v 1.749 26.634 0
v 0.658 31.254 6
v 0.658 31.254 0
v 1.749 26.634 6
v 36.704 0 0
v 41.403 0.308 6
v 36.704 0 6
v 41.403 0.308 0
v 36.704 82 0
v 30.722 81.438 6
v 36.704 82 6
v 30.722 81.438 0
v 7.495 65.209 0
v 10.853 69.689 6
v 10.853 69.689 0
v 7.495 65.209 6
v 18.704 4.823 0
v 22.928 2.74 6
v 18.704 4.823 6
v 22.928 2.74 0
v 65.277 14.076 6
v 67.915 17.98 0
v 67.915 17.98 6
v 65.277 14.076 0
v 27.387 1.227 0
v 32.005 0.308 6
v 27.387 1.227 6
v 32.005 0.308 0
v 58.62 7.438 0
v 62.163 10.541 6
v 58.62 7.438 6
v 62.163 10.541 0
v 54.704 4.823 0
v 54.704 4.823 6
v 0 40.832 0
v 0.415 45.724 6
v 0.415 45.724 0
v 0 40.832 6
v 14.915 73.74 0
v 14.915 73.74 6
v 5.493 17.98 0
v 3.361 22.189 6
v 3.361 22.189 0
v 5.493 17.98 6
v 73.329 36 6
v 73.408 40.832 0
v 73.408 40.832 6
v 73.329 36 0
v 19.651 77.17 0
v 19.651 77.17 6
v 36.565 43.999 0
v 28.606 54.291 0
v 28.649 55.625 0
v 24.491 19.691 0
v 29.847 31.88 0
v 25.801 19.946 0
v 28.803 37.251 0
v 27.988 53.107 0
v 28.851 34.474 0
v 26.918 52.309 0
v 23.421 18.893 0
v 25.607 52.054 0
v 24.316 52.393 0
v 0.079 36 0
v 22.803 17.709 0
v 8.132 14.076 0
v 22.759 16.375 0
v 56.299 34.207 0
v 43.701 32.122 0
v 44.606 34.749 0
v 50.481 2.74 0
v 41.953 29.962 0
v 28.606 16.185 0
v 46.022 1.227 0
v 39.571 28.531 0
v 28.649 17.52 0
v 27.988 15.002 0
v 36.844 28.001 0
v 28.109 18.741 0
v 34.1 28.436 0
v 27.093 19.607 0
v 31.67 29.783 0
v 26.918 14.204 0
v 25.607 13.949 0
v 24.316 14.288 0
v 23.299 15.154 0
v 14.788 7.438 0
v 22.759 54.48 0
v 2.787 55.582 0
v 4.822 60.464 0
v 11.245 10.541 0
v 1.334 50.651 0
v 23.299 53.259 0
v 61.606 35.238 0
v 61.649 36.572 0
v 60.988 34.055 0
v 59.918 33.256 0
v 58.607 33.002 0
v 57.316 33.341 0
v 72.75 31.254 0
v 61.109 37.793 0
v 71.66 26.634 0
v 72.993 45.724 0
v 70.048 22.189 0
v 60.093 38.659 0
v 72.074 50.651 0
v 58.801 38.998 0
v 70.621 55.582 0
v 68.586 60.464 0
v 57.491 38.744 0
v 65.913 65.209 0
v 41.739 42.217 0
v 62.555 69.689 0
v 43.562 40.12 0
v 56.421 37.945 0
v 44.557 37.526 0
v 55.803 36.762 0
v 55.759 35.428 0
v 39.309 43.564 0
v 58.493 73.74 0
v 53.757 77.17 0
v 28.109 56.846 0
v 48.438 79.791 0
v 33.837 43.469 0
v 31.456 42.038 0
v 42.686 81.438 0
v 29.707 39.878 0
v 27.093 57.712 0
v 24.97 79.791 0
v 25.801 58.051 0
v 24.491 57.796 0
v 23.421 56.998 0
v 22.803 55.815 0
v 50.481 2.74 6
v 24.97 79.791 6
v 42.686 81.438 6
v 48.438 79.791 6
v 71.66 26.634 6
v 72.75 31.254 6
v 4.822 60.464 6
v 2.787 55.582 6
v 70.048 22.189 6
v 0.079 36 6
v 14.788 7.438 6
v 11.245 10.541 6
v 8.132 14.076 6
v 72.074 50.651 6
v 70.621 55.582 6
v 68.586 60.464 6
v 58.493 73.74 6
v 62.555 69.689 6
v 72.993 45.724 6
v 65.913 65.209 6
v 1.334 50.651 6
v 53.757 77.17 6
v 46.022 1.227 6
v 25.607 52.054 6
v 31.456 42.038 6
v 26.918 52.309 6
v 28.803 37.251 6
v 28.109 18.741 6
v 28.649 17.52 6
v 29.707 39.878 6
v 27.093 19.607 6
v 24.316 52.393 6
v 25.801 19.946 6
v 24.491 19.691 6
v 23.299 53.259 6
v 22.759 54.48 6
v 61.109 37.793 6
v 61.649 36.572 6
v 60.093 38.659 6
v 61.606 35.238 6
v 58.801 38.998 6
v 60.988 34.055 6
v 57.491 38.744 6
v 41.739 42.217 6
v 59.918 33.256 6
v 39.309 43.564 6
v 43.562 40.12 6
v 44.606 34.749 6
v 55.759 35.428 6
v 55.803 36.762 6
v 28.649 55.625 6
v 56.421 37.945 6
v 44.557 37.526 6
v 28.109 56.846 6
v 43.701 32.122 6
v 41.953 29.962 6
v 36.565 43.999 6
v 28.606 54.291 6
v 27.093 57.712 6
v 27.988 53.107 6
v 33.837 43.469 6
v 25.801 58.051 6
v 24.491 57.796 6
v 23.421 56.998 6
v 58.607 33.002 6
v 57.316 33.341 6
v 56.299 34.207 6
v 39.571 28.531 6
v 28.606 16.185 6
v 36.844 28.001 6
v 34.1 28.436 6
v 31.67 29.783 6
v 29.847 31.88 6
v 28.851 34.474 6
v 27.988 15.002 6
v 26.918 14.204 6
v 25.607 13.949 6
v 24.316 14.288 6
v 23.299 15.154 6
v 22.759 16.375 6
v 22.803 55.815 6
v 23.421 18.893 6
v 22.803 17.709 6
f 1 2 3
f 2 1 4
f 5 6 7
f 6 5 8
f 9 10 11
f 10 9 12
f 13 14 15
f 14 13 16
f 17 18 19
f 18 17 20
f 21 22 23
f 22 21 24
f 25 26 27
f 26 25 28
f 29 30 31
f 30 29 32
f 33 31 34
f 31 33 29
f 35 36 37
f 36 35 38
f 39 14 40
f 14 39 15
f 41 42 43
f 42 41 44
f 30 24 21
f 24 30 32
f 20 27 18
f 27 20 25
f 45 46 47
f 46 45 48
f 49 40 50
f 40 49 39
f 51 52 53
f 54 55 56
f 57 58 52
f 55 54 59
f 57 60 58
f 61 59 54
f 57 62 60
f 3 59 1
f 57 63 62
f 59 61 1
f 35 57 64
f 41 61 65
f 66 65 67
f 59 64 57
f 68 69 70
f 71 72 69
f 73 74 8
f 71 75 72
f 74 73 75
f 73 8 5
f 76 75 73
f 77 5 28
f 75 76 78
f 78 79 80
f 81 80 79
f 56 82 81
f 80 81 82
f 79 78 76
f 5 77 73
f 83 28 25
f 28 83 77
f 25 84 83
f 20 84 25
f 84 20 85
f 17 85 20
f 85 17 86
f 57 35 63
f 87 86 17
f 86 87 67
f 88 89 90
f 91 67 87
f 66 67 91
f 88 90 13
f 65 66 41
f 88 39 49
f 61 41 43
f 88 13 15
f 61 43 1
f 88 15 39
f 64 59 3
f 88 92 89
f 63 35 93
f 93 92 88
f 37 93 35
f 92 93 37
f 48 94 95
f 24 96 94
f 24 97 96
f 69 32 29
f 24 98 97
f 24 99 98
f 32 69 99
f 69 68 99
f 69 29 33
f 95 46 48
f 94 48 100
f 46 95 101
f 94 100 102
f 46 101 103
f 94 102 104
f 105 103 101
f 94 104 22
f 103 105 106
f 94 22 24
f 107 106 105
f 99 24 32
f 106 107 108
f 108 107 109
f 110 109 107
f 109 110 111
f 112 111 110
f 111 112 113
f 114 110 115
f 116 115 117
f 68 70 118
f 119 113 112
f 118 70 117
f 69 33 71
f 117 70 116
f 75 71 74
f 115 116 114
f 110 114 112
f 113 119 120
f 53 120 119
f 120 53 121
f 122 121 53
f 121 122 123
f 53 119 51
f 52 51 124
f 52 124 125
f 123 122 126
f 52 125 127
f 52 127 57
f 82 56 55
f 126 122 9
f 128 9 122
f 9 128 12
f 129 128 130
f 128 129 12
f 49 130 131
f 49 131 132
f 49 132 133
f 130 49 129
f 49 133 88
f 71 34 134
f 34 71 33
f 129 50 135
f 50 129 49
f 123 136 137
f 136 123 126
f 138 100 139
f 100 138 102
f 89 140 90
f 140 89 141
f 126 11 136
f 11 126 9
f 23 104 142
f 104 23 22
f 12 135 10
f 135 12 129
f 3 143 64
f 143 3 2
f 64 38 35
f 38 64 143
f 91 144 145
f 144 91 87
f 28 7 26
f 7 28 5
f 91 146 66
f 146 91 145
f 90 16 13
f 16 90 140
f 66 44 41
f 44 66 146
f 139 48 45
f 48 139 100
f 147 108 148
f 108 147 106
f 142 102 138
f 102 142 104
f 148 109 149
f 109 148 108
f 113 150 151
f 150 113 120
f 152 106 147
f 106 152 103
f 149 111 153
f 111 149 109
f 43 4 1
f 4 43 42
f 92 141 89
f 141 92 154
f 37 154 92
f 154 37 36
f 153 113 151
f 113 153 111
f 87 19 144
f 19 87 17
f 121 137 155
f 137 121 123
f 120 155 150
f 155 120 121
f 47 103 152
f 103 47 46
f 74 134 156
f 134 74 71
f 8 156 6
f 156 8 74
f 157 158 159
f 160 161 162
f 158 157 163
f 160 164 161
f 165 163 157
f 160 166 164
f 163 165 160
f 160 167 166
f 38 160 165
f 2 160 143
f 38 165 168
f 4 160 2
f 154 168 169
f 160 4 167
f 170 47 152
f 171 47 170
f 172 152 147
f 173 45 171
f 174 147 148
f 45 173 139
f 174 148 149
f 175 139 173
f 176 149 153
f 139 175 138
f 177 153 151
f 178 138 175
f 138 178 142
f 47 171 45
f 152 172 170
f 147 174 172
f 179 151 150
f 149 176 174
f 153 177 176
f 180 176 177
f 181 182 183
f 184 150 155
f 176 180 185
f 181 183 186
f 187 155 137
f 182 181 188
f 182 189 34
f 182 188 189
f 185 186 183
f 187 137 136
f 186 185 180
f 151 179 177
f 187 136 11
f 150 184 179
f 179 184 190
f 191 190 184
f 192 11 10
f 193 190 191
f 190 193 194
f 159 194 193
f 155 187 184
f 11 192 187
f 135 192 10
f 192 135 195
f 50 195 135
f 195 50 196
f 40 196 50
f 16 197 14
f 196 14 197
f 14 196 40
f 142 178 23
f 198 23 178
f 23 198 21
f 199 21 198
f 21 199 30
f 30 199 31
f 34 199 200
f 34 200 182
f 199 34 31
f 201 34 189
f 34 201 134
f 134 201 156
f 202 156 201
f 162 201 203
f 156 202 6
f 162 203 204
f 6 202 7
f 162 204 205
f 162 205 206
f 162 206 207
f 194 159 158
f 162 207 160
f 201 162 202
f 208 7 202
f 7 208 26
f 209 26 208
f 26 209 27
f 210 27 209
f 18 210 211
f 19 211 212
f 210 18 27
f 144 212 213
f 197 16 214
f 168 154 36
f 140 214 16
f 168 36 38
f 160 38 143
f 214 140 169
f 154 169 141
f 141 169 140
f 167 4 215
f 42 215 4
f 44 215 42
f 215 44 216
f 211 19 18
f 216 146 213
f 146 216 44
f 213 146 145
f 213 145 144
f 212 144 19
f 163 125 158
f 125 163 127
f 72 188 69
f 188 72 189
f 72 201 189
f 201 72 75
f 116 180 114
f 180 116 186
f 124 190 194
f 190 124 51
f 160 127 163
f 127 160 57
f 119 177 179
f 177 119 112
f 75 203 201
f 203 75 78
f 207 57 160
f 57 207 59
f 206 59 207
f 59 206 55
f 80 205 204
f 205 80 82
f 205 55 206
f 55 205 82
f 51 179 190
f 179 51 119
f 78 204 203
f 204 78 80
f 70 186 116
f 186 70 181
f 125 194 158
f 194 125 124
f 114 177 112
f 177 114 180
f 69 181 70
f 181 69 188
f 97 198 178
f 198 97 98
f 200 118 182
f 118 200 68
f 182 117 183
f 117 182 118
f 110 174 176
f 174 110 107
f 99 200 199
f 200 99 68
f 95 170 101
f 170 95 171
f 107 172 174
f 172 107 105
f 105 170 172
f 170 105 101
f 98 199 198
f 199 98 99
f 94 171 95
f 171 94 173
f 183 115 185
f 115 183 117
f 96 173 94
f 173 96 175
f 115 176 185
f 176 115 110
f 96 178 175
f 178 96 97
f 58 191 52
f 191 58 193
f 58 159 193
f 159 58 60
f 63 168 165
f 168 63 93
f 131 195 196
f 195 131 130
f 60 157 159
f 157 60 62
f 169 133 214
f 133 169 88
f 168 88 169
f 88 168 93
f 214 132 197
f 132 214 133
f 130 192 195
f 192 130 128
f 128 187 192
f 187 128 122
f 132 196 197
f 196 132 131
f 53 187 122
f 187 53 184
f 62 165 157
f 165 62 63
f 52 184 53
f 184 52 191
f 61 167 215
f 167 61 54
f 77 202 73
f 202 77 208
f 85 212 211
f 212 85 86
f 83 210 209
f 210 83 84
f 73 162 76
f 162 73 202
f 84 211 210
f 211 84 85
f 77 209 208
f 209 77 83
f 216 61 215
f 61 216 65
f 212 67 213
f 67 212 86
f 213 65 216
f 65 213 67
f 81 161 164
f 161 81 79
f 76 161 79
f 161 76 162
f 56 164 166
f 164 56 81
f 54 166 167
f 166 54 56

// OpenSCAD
$fn = 32;

// ----------------------------------------------------------------------
// Cam plate: single_lobe cam, base R36
// ----------------------------------------------------------------------

// --- parameters (mm) ---
base_r = 36;              // base circle radius
lobe_h = 10;              // cam lobe rise
bore_r = 8;               // shaft bore radius
plate_t = 6;              // plate thickness, Z (extrusion height)
ring_r = 22;              // lightening ring radius
bolt_r = 3;               // lightening hole radius

profile = [[73.329, 36], [73.408, 40.832], [72.993, 45.724], [72.074, 50.651], [70.621, 55.582], [68.586, 60.464], [65.913, 65.209], [62.555, 69.689], [58.493, 73.74], [53.757, 77.17], [48.438, 79.791], [42.686, 81.438], [36.704, 82], [30.722, 81.438], [24.97, 79.791], [19.651, 77.17], [14.915, 73.74], [10.853, 69.689], [7.495, 65.209], [4.822, 60.464], [2.787, 55.582], [1.334, 50.651], [0.415, 45.724], [0, 40.832], [0.079, 36], [0.658, 31.254], [1.749, 26.634], [3.361, 22.189], [5.493, 17.98], [8.132, 14.076], [11.245, 10.541], [14.788, 7.438], [18.704, 4.823], [22.928, 2.74], [27.387, 1.227], [32.005, 0.308], [36.704, 0], [41.403, 0.308], [46.022, 1.227], [50.481, 2.74], [54.704, 4.823], [58.62, 7.438], [62.163, 10.541], [65.277, 14.076], [67.915, 17.98], [70.048, 22.189], [71.66, 26.634], [72.75, 31.254]];  // primary outline, 48 points, counter clockwise
void_1 = [[44.557, 37.526], [43.562, 40.12], [41.739, 42.217], [39.309, 43.564], [36.565, 43.999], [33.837, 43.469], [31.456, 42.038], [29.707, 39.878], [28.803, 37.251], [28.851, 34.474], [29.847, 31.88], [31.67, 29.783], [34.1, 28.436], [36.844, 28.001], [39.571, 28.531], [41.953, 29.962], [43.701, 32.122], [44.606, 34.749]];  // shaft bore, 18 points
void_2 = [[61.649, 36.572], [61.109, 37.793], [60.093, 38.659], [58.801, 38.998], [57.491, 38.744], [56.421, 37.945], [55.803, 36.762], [55.759, 35.428], [56.299, 34.207], [57.316, 33.341], [58.607, 33.002], [59.918, 33.256], [60.988, 34.055], [61.606, 35.238]];  // lightening hole 1, 14 points
void_3 = [[28.649, 55.625], [28.109, 56.846], [27.093, 57.712], [25.801, 58.051], [24.491, 57.796], [23.421, 56.998], [22.803, 55.815], [22.759, 54.48], [23.299, 53.259], [24.316, 52.393], [25.607, 52.054], [26.918, 52.309], [27.988, 53.107], [28.606, 54.291]];  // lightening hole 2, 14 points
void_4 = [[28.649, 17.52], [28.109, 18.741], [27.093, 19.607], [25.801, 19.946], [24.491, 19.691], [23.421, 18.893], [22.803, 17.709], [22.759, 16.375], [23.299, 15.154], [24.316, 14.288], [25.607, 13.949], [26.918, 14.204], [27.988, 15.002], [28.606, 16.185]];  // lightening hole 3, 14 points

// --- the one profile operation ---
difference() {
  linear_extrude(height = plate_t) polygon(points = profile);
  translate([0, 0, -1])
    linear_extrude(height = plate_t + 2) polygon(points = void_1);
  translate([0, 0, -1])
    linear_extrude(height = plate_t + 2) polygon(points = void_2);
  translate([0, 0, -1])
    linear_extrude(height = plate_t + 2) polygon(points = void_3);
  translate([0, 0, -1])
    linear_extrude(height = plate_t + 2) polygon(points = void_4);
}
